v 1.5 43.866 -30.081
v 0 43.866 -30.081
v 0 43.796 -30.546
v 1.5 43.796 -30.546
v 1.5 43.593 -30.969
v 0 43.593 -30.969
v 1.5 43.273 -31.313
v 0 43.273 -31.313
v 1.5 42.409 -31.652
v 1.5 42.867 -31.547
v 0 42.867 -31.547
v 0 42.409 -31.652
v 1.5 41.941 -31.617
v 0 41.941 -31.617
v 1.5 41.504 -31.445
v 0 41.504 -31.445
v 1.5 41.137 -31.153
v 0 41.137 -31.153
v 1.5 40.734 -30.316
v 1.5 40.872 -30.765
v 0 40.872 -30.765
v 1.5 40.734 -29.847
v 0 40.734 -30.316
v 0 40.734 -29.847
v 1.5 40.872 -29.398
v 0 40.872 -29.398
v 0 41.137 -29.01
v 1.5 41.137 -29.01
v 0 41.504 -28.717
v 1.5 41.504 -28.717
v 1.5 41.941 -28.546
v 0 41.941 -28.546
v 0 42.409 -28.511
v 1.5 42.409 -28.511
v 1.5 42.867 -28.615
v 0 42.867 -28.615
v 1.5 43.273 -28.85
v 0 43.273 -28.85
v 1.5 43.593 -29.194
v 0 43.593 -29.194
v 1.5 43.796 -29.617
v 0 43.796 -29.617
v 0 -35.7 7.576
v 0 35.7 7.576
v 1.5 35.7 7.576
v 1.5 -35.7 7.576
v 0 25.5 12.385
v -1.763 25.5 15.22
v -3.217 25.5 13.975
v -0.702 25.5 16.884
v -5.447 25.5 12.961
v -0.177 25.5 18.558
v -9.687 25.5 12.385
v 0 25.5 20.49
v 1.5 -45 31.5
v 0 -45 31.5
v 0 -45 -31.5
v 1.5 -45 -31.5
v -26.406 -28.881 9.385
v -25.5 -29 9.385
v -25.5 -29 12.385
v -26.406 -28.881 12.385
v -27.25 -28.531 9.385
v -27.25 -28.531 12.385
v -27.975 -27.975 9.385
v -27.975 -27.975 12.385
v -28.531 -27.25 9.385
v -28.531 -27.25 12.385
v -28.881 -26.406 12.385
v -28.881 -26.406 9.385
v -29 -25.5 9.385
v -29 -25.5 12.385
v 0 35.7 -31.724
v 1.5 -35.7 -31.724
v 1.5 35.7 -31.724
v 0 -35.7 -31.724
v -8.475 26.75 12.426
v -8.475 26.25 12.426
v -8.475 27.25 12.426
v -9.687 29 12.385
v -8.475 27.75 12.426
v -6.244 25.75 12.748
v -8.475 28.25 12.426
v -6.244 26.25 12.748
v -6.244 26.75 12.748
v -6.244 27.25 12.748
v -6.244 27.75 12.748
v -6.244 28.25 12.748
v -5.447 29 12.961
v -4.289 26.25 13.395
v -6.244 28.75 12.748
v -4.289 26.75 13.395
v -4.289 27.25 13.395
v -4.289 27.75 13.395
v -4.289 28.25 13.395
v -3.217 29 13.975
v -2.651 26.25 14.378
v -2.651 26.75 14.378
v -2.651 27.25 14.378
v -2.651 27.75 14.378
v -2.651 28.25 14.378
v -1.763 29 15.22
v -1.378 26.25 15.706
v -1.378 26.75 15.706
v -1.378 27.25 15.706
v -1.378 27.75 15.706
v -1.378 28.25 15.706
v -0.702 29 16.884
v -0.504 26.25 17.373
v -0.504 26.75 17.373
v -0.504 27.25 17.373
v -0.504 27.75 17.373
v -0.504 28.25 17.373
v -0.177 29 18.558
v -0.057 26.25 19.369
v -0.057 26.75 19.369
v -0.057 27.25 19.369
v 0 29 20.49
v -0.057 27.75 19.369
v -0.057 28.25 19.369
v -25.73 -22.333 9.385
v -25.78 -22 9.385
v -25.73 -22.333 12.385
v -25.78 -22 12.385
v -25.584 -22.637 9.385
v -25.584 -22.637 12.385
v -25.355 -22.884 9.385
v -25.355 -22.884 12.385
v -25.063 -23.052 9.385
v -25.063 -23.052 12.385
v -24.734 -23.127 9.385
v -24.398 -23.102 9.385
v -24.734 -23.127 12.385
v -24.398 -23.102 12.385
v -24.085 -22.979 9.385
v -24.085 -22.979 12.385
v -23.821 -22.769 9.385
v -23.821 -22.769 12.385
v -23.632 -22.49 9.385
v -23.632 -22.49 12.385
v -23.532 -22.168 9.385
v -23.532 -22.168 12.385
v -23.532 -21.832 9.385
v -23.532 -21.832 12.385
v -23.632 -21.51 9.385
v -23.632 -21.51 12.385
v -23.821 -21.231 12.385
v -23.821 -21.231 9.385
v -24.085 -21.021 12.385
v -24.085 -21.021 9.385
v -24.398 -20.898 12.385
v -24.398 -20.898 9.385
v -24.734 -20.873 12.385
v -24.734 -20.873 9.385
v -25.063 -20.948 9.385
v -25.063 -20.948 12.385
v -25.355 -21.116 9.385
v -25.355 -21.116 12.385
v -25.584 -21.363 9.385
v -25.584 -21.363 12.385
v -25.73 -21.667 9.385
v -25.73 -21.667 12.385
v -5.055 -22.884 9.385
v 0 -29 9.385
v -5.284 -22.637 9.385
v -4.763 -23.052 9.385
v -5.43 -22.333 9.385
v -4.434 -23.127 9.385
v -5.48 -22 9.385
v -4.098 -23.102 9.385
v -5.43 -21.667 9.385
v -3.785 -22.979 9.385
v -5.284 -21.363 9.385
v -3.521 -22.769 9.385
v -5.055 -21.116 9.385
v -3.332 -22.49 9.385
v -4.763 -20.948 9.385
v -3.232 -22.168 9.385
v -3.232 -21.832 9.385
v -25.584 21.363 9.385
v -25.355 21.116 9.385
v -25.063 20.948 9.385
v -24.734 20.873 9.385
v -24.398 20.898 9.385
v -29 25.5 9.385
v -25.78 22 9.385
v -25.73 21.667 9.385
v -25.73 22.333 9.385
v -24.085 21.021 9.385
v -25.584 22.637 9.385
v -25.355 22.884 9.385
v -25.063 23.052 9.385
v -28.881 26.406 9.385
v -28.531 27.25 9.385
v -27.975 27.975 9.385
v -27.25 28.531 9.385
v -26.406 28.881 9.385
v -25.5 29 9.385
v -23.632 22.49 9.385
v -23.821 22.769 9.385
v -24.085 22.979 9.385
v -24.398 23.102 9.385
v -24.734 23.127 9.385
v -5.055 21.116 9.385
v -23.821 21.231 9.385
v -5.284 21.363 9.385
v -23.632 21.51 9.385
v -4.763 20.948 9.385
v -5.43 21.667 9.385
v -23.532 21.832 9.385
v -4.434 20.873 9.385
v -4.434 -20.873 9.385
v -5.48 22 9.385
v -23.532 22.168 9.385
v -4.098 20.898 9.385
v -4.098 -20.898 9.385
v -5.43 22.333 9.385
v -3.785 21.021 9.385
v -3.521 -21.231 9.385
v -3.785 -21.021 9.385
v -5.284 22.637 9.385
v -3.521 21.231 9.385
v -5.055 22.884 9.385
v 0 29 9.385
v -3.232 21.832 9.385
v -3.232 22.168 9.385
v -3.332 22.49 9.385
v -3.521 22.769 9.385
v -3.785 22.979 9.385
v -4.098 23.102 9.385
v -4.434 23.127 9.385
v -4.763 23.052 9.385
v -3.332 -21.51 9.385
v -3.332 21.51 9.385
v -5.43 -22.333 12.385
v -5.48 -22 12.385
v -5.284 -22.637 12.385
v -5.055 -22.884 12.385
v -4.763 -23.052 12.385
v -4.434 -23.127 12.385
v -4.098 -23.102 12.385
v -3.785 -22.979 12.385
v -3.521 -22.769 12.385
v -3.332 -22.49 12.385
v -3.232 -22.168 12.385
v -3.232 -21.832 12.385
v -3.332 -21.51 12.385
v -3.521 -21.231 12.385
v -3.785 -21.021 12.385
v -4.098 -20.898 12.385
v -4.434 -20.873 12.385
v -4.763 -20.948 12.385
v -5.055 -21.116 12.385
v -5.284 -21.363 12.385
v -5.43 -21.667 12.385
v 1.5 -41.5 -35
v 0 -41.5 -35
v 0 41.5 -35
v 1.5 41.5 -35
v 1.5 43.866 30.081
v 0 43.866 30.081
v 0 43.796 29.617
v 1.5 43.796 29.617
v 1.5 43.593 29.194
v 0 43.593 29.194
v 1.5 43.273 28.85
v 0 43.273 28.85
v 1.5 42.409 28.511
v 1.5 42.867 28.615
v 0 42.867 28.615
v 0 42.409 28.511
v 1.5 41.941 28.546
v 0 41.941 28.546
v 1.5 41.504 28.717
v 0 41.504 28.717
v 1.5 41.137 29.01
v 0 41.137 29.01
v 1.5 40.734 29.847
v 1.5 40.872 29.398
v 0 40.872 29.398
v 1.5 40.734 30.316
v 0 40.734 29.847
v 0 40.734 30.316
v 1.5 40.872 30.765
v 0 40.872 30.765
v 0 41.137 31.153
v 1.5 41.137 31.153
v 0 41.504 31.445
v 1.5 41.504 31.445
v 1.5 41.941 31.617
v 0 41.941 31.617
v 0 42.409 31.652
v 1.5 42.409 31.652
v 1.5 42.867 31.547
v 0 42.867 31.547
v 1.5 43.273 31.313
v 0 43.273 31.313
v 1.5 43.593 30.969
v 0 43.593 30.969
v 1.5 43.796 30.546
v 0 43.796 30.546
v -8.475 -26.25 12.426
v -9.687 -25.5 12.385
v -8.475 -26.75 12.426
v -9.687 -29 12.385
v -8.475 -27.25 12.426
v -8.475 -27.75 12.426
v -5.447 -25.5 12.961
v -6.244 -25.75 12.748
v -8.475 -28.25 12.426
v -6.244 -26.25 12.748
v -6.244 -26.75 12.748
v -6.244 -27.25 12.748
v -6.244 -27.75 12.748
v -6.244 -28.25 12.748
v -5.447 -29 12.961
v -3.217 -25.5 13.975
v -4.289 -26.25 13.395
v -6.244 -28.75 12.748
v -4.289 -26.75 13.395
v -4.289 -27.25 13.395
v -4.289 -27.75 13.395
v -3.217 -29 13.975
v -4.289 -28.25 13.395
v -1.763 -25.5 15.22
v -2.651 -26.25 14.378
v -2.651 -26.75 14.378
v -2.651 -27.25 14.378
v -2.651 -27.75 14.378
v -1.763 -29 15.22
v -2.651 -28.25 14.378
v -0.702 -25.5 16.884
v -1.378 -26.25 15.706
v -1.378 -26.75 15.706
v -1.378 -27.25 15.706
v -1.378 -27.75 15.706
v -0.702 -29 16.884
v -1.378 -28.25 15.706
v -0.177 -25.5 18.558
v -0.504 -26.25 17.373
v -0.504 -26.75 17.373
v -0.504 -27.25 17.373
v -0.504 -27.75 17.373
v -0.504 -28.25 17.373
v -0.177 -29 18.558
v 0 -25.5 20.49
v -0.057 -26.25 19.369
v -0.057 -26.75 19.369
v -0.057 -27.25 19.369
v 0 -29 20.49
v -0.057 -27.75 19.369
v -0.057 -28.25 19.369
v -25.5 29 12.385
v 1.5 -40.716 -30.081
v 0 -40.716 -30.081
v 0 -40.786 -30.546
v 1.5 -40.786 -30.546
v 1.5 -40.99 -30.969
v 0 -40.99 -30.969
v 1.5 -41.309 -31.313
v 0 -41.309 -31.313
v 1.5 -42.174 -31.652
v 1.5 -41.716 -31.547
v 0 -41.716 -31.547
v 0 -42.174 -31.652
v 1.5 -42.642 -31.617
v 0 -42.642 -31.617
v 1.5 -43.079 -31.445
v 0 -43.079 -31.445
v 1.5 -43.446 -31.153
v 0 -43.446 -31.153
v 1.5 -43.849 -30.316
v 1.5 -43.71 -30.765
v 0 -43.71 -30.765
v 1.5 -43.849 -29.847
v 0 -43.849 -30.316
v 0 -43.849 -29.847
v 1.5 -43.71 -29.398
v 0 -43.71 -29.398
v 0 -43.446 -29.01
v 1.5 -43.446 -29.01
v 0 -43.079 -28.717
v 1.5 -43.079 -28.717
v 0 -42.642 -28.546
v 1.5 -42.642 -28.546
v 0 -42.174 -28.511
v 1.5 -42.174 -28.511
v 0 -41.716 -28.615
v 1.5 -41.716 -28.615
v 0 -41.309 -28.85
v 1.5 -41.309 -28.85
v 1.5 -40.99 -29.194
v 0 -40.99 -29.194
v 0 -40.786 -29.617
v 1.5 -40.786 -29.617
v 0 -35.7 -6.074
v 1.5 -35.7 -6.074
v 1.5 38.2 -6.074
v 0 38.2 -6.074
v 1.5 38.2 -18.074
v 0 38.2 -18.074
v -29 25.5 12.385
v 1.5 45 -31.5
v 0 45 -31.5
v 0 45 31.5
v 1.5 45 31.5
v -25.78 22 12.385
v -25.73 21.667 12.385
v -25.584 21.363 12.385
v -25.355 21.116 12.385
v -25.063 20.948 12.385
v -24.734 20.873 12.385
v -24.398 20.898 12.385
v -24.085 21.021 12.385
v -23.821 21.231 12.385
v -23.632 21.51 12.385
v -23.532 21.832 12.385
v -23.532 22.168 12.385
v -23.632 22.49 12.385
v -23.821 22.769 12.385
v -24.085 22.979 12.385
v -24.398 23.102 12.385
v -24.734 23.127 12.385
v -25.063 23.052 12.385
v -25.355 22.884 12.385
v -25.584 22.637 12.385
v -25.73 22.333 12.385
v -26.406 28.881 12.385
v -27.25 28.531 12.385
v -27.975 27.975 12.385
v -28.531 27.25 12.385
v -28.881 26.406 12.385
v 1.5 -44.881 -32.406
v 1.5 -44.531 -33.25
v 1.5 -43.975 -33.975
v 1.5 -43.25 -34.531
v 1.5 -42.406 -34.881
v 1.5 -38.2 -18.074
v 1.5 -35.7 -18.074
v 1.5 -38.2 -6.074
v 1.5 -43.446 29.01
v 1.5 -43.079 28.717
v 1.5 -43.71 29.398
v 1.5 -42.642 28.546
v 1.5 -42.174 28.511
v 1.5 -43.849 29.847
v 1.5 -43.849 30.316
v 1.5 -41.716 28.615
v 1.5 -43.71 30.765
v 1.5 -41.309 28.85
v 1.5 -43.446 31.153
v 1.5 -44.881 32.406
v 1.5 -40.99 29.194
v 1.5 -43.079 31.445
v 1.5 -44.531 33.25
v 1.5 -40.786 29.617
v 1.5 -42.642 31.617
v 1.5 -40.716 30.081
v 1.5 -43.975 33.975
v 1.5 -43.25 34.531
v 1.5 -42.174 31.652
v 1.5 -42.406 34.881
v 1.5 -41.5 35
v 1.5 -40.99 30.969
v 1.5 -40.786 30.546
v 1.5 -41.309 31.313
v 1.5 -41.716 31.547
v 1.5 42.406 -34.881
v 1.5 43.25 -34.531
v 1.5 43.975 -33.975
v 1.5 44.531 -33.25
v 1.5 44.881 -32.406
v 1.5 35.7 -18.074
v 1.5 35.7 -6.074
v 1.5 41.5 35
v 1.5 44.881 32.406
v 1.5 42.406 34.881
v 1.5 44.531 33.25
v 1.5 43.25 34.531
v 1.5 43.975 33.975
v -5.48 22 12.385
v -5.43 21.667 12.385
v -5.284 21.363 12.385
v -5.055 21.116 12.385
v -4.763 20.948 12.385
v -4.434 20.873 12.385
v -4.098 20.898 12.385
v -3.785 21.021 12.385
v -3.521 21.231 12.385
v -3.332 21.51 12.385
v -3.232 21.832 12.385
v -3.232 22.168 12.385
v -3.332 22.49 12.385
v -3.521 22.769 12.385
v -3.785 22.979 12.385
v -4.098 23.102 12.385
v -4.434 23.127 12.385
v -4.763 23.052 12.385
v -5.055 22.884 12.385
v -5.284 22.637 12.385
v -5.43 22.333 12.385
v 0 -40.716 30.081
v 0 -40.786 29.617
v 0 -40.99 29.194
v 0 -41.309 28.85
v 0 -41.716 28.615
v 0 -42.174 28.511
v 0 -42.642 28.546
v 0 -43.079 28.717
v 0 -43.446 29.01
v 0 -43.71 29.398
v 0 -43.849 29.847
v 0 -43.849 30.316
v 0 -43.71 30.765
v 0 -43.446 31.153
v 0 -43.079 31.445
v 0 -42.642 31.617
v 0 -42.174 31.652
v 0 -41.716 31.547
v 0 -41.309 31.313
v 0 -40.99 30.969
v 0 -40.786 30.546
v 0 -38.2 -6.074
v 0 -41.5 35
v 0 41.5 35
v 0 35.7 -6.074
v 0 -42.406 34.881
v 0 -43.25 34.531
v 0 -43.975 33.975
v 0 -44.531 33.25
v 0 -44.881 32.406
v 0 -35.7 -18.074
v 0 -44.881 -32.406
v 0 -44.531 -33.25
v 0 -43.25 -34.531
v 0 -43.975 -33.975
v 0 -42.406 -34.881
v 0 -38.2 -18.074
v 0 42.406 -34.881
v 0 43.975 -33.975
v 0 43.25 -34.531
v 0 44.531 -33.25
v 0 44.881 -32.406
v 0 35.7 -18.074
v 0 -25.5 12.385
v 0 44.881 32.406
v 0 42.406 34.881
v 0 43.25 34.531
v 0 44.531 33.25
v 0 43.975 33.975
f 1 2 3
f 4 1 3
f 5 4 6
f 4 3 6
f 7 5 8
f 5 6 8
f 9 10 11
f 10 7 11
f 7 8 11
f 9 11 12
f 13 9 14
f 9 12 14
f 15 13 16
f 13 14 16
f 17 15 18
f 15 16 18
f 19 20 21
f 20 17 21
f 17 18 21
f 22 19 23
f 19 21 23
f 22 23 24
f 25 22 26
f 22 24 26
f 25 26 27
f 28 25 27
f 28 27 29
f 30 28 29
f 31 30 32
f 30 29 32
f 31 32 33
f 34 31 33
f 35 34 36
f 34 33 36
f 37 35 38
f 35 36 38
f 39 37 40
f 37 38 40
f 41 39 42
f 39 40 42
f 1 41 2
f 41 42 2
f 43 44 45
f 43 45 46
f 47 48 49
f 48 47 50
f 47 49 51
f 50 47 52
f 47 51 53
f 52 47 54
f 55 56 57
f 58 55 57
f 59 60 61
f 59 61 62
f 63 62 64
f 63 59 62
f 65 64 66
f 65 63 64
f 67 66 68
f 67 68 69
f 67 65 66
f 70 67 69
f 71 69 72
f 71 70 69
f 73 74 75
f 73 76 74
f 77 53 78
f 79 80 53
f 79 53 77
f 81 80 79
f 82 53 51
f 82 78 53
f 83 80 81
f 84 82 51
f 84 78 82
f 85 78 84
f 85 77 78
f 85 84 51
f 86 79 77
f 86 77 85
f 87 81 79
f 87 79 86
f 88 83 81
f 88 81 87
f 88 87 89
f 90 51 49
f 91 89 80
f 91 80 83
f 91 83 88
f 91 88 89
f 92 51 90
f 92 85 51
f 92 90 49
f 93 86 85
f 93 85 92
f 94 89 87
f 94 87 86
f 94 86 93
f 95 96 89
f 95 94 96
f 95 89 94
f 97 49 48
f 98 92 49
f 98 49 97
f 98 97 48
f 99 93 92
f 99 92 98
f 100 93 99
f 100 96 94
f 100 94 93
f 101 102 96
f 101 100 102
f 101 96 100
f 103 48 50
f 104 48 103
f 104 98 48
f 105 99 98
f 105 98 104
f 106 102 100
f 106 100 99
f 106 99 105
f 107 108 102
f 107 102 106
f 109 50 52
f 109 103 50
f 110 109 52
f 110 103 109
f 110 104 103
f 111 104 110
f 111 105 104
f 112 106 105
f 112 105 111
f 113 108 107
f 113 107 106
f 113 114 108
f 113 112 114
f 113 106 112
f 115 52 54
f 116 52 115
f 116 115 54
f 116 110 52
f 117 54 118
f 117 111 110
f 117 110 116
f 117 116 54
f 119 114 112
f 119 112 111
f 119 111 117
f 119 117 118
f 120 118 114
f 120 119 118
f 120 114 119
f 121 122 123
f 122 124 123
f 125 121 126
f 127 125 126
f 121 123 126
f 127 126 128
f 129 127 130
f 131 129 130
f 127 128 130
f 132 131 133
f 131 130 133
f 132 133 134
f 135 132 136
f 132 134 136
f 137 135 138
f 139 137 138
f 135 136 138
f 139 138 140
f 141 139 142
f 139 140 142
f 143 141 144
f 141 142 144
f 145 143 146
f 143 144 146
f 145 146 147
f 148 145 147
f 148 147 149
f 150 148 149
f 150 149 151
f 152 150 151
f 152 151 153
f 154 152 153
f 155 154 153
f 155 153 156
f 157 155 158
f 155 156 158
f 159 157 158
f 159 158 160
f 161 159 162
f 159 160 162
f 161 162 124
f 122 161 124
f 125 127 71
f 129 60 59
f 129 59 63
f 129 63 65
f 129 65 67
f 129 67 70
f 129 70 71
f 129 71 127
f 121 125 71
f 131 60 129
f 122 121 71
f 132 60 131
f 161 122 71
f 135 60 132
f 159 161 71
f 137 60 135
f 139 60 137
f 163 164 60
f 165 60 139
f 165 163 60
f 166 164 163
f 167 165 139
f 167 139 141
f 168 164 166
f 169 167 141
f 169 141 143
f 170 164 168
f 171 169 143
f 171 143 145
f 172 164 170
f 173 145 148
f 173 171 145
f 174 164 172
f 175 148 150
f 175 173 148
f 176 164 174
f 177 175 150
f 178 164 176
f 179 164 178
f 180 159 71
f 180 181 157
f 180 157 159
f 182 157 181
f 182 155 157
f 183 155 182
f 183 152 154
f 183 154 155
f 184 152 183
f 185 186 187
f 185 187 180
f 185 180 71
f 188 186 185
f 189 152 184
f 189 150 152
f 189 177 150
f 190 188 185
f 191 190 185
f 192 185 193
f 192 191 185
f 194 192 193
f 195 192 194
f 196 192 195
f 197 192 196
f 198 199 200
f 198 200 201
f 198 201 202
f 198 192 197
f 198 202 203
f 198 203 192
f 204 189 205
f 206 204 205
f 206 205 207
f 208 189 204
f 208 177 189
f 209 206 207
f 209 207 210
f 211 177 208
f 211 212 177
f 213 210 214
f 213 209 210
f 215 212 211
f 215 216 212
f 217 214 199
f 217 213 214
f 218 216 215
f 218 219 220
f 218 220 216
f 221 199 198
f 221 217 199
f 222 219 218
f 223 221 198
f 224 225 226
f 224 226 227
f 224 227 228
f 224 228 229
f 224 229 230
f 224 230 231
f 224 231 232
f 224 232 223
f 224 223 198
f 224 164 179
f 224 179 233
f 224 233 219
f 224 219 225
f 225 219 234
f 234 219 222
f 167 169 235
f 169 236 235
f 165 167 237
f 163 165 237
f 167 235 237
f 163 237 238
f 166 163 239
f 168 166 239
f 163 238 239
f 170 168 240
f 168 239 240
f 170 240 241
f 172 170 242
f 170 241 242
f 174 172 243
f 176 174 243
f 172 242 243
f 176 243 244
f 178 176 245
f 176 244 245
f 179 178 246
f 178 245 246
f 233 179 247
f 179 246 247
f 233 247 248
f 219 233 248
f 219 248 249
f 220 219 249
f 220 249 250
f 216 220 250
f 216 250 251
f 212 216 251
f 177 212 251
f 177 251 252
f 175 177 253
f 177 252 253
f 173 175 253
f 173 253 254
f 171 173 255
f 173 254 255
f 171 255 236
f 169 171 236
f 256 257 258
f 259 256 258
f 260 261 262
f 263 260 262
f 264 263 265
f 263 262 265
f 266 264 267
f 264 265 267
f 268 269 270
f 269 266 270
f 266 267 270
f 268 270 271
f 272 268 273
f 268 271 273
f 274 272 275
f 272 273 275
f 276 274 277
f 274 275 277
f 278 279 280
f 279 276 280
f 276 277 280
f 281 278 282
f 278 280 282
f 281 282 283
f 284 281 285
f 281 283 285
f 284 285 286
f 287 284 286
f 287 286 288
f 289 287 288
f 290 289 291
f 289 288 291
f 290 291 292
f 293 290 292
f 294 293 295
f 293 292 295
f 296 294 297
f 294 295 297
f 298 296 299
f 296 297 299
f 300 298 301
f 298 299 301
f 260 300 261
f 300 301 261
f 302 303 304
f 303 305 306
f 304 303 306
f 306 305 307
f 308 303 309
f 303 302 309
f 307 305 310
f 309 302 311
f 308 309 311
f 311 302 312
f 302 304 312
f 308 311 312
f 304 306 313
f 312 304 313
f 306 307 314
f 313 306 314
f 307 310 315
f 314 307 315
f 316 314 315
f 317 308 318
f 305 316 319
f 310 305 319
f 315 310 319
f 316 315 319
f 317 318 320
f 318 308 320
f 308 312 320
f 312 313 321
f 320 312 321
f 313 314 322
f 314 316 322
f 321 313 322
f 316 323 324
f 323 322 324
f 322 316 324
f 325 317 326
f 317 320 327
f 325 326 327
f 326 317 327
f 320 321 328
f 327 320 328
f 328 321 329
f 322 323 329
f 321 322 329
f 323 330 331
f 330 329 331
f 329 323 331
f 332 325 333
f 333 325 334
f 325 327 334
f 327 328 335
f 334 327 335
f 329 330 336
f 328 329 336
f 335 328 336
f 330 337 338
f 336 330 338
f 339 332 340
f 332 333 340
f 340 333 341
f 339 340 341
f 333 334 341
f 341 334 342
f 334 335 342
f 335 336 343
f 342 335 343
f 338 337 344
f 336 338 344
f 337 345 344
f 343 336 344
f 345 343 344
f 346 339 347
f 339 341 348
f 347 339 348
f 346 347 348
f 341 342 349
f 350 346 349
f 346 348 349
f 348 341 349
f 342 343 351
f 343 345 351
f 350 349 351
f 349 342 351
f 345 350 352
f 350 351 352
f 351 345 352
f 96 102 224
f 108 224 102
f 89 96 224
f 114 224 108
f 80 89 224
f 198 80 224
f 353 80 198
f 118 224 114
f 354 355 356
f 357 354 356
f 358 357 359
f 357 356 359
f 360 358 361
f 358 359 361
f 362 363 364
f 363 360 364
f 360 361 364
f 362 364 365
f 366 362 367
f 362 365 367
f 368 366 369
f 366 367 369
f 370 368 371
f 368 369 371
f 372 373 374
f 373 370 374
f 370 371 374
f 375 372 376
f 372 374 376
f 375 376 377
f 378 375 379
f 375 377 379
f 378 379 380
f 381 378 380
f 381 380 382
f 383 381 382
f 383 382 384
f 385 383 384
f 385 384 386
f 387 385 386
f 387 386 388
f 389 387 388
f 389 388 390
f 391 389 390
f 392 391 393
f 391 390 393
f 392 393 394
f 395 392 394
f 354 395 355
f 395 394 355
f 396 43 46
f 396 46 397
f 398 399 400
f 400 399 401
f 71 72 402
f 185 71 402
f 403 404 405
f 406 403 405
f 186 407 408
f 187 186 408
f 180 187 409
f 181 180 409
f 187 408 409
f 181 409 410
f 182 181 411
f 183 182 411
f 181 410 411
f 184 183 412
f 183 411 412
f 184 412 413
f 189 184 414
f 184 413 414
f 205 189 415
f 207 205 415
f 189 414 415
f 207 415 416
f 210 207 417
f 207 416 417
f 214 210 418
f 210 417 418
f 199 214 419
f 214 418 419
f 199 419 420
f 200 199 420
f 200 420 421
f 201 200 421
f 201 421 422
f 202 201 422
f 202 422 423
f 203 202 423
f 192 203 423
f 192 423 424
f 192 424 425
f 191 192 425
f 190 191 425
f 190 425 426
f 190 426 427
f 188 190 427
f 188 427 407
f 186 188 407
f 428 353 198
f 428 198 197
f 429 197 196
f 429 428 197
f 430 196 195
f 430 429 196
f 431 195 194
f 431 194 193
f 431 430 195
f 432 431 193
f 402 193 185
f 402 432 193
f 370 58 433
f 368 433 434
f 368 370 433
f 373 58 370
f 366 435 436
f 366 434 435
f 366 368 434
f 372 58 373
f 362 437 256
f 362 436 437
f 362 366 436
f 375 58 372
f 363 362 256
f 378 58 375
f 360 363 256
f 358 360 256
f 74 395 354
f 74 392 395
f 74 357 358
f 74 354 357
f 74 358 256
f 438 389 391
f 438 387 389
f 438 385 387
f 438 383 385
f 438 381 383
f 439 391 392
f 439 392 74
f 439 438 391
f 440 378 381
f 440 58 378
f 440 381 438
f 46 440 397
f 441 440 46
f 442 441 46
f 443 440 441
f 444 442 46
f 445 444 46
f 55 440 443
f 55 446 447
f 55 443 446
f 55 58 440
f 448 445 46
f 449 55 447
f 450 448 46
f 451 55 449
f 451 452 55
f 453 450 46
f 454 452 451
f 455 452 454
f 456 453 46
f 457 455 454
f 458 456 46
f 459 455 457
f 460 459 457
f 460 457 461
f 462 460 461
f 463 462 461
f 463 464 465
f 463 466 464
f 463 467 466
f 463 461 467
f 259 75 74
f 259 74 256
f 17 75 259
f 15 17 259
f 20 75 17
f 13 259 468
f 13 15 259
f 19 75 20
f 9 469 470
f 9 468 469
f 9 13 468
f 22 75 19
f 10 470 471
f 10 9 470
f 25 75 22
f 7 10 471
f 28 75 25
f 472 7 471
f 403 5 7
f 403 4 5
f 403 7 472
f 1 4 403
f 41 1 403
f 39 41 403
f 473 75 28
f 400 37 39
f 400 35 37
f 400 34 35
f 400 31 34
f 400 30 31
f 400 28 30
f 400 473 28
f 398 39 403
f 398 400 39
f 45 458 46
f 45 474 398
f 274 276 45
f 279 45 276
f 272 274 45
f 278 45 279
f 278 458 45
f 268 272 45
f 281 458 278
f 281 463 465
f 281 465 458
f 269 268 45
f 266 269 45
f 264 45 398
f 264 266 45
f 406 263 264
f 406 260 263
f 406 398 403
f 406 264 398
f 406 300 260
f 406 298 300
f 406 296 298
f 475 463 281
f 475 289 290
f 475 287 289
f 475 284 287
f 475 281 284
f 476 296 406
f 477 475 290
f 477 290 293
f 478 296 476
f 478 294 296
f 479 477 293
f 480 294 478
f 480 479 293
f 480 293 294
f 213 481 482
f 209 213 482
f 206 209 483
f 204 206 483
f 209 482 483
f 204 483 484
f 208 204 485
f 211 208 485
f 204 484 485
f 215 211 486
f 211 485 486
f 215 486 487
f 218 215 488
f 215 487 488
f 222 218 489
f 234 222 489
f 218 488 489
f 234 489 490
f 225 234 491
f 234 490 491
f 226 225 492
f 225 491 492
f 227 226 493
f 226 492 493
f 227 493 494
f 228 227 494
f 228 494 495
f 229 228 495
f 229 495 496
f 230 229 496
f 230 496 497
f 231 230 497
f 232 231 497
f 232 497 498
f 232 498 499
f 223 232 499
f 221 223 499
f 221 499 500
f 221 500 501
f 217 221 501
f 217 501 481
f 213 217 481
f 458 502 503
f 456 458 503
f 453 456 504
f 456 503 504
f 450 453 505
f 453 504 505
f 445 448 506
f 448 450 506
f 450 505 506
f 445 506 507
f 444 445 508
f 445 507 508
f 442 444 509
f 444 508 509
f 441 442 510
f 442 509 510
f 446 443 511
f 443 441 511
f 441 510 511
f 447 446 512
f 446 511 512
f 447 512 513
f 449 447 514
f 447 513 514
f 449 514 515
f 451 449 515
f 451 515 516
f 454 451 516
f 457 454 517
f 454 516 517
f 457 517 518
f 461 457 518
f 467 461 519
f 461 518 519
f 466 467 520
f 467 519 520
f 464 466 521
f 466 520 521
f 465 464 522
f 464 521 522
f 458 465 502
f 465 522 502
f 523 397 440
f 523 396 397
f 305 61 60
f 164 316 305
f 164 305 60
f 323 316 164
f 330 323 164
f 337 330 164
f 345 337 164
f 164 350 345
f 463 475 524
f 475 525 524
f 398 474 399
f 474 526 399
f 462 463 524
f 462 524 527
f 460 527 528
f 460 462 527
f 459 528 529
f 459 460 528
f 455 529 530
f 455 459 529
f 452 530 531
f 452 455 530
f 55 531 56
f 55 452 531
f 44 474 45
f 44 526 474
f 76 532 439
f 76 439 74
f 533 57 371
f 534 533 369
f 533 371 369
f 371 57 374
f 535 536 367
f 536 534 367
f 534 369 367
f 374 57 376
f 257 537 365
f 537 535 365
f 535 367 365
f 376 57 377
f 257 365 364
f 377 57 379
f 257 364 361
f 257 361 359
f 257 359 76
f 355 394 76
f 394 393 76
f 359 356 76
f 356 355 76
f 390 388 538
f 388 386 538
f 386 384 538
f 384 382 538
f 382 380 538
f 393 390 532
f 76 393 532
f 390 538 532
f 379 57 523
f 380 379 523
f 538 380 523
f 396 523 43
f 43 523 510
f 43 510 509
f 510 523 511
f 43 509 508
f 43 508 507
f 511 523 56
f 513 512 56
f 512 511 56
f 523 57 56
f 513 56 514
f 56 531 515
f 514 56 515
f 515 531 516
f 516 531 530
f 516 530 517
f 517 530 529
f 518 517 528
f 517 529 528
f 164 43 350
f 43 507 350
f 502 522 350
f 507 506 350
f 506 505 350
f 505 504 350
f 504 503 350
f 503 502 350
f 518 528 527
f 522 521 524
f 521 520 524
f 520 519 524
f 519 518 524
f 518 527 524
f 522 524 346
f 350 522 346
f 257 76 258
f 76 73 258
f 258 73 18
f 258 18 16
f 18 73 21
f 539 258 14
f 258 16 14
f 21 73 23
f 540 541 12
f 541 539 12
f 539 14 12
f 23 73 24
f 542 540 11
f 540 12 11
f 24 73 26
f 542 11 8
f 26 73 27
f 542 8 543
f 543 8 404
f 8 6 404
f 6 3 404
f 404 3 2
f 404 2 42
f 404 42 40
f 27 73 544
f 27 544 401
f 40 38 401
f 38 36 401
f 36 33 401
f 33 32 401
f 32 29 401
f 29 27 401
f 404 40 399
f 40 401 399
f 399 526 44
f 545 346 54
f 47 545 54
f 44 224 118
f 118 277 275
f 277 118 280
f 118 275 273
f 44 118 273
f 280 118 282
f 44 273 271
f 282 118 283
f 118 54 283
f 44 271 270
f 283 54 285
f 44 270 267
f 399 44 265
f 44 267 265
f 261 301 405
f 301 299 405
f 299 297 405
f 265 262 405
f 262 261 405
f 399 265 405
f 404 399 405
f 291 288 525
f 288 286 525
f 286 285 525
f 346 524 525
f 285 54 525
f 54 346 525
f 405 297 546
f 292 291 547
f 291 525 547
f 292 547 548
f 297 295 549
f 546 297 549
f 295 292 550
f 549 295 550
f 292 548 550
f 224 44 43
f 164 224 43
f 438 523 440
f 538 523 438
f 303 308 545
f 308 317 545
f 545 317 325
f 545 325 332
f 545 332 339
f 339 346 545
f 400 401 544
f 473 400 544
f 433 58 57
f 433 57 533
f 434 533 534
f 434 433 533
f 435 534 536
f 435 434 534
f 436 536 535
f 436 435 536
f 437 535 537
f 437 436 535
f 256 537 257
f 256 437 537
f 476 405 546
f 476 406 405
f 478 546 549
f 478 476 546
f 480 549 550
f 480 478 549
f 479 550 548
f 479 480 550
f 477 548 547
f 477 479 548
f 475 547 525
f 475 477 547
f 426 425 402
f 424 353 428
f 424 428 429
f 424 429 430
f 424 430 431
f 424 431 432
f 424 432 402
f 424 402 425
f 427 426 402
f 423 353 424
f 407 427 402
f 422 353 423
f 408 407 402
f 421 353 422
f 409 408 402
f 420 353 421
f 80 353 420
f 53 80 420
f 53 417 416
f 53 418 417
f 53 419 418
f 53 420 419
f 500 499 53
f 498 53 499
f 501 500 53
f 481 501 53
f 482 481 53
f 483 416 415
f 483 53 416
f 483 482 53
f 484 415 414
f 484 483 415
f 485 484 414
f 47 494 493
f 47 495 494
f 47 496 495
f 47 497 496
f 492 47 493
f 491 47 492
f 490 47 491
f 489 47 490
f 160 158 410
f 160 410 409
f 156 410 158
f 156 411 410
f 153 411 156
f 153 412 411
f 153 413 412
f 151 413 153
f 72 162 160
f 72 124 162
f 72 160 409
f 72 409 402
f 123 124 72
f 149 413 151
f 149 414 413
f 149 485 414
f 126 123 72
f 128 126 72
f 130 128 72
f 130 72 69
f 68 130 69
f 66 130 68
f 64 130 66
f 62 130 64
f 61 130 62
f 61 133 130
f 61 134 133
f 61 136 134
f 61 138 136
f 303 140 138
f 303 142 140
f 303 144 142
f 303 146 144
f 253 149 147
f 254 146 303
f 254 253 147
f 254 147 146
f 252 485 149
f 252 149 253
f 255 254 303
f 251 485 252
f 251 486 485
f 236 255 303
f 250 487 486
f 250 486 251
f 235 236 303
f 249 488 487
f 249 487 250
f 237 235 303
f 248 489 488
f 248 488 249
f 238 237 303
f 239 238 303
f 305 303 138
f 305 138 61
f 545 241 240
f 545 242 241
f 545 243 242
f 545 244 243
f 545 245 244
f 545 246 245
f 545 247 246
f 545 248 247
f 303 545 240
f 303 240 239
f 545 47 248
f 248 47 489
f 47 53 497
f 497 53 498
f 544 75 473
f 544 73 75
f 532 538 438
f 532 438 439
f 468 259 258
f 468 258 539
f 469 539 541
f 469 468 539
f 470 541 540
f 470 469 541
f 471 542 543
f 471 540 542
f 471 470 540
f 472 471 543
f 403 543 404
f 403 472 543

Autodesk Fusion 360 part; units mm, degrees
sketch "Sketch1" plane through (0, 0, 0) normal (1, 0, 0) x (0, 1, 0)
  line L0 (45, 35) -> (-45, 35)
  line L1 (-45, 35) -> (-45, -35)
  line L2 (-45, -35) -> (45, -35)
  line L3 (45, -35) -> (45, 35)
  line L4 (45, 35) -> (-45, -35) construction
  line L5 (-45, 35) -> (45, -35) construction
  line L6 (0, 0) -> (0, -35) construction
  line L7 (39.5, 9.4262) -> (-39.5, 9.4262) construction
  line L8 (-39.5, 9.4262) -> (-39.5, -33.5738) construction
  line L9 (-39.5, -33.5738) -> (39.5, -33.5738) construction
  line L10 (39.5, -33.5738) -> (39.5, 9.4262) construction
  line L11 (39.5, 9.4262) -> (-39.5, -33.5738) construction
  line L12 (-39.5, 9.4262) -> (39.5, -33.5738) construction
  line L13 (35.7, 7.5762) -> (-35.7, 7.5762)
  line L14 (-35.7, 7.5762) -> (-35.7, -31.7238)
  line L15 (-35.7, -31.7238) -> (35.7, -31.7238)
  line L16 (35.7, -31.7238) -> (35.7, 7.5762)
  line L17 (35.7, 7.5762) -> (-35.7, -31.7238) construction
  line L18 (-35.7, 7.5762) -> (35.7, -31.7238) construction
  circle A0 centre (42.2913, -30.0813) radius 1.575
  line L19 (0, 0) -> (10.5805, 0) construction
  circle A1 centre (-42.2913, -30.0813) radius 1.575
  circle A2 centre (42.2913, 30.0813) radius 1.575
  circle A3 centre (-42.2913, 30.0813) radius 1.575
  line L20 (0, 0) -> (0, 0.8708) construction
  line L21 (0, 0.8708) -> (0, 35) construction
  line L22 (25, 32.3854) -> (-25, 32.3854) construction
  line L23 (-25, 32.3854) -> (-25, 12.3854) construction
  line L24 (-25, 12.3854) -> (25, 12.3854) construction
  line L25 (25, 12.3854) -> (25, 32.3854) construction
  line L26 (25, 32.3854) -> (-25, 12.3854) construction
  line L27 (-25, 32.3854) -> (25, 12.3854) construction
  line L28 (29, 12.3854) -> (-29, 12.3854)
  line L29 (-29, 12.3854) -> (-29, 9.3854)
  line L30 (-29, 9.3854) -> (29, 9.3854)
  line L31 (29, 9.3854) -> (29, 12.3854)
  line L32 (29, 12.3854) -> (-29, 9.3854) construction
  line L33 (-29, 12.3854) -> (29, 9.3854) construction
  line L34 (0, -12.0738) -> (39.5, -12.0738) construction
  line L35 (35.7, -6.0738) -> (38.2, -6.0738)
  line L36 (38.2, -6.0738) -> (38.2, -18.0738)
  line L37 (38.2, -18.0738) -> (35.7, -18.0738)
  line L38 (35.7, -18.0738) -> (35.7, -6.0738)
  line L39 (-38.2, -18.0738) -> (-35.7, -18.0738)
  line L40 (-38.2, -6.0738) -> (-38.2, -18.0738)
  line L41 (-35.7, -6.0738) -> (-38.2, -6.0738)
  point P0 (0, -12.0738)
  point P1 (0, -12.0738)
  point P2 (0, 22.3854)
  point P3 (0, 10.8854)
  point P4 (38.2, -12.0738)
  dimension "d8" = 90
  dimension "d9" = 70
  dimension "d12" = 79
  dimension "d13" = 43
  dimension "d14" = 71.4
  dimension "d15" = 39.3
  dimension "d17" = 3.15
  dimension "d21" = 50
  dimension "d22" = 20
  dimension "d25" = 58
  dimension "d26" = 3
  dimension "d58" = 2.5
  dimension "d59" = 12
extrude "Extrude1" add sketch "Sketch1" along normal blind 1.5 contours L0 L1 L2 L3 | L28 L29 L30 L31
extrude "Extrude2" add sketch "Sketch1" against normal blind 29 contours L28 L29 L30 L31
sketch "Sketch2" plane through (0, 0, 12.3854) normal (0, 0, 1) x (-1, 0, 0)
  line L0 (0, 29) -> (0, -29)
  line L1 (0, -29) -> (29, -29)
  line L2 (29, -29) -> (29, 29)
  line L3 (29, 29) -> (0, 29)
  line L4 (0, 29) -> (29, -29) construction
  line L5 (27.5, 25) -> (1.5, 25) construction
  line L6 (1.5, 25) -> (1.5, -25) construction
  line L7 (1.5, -25) -> (27.5, -25) construction
  line L8 (27.5, -25) -> (27.5, 25) construction
  line L9 (27.5, 25) -> (1.5, -25) construction
  line L10 (1.5, 25) -> (27.5, -25) construction
  circle A0 centre (4.35, -22) radius 1.575 construction
  circle A1 centre (24.65, -22) radius 1.575 construction
  circle A2 centre (4.35, 22) radius 1.575 construction
  circle A3 centre (24.65, 22) radius 1.575 construction
  line L11 (4.35, -22) -> (24.65, 22) construction
  circle A4 centre (4.35, -22) radius 1.1303
  circle A5 centre (24.65, -22) radius 1.1303
  circle A6 centre (4.35, 22) radius 1.1303
  circle A7 centre (24.65, 22) radius 1.1303
  point P0 (14.5, 0)
  point P1 (14.5, 0)
  point P2 (14.5, 0)
  dimension "d32" = 26
  dimension "d33" = 50
  dimension "d37" = 3.15
  dimension "d40" = 20.3
  dimension "d41" = 44
  dimension "d51" = 2.2606
  dimension "d54" = 20.3
  dimension "d55" = 44
fillet "Fillet1" radius 3.5 2 edges at (-29, 29, 10.8854) (-29, -29, 10.8854)
fillet "Fillet2" radius 3.5 4 edges at (0.75, 45, 35) (0.75, 45, -35) (0.75, -45, 35) (0.75, -45, -35)
sketch "Sketch3" plane through (0, -29, 0) normal (0, -1, 0) x (1, 0, 0)
  line L0 (-25.5, 12.3854) -> (-25.5, 9.3854)
  line L1 (-25.5, 9.3854) -> (0, 9.3854)
  line L2 (0, 9.3854) -> (0, 12.3854)
  line L3 (0, 12.3854) -> (-25.5, 12.3854)
  line L4 (0, 35) -> (0, -35) construction
  line L5 (-27.5, 12.3854) -> (-1.5, 12.3854) construction
  spline S0 degree 5 poles (-9.6866, 12.3854) (-9.3387, 12.3854) (-8.655, 12.4012) (-7.6662, 12.4723) (-6.4221, 12.6617) (-4.9991, 13.0566) (-3.7214, 13.6129) (-2.6063, 14.3356) (-1.6713, 15.2291) (-0.9285, 16.2912) (-0.387, 17.5173) (-0.1222, 18.6267) (-0.0222, 19.5305) (0, 20.1649) (0, 20.4901) knots 0 0 0 0 0 0 0.1 0.2 0.3 0.4 0.5 0.6 0.7 0.8 0.9 1 1 1 1 1 1
  line L6 (0, 18.6225) -> (0, 22.3578)
  line L7 (-11.558, 12.3854) -> (-7.8153, 12.3854)
  line L8 (-9.6866, 12.3854) -> (0, 12.3854)
  line L9 (0, 20.4901) -> (0, 12.3854)
  point P0 (-2.4919, 14.508)
extrude "Extrude3" add sketch "Sketch3" against normal blind 3.5 contours L3 S0 L6 L7 L8 L9
sketch "Sketch4" plane through (0, 29, 0) normal (0, 1, 0) x (-1, 0, 0)
  line L0 (25.5, 9.3854) -> (25.5, 12.3854)
  line L1 (25.5, 12.3854) -> (0, 12.3854)
  line L2 (0, 12.3854) -> (0, 9.3854)
  line L3 (0, 9.3854) -> (25.5, 9.3854)
  line L4 (0, 12.3854) -> (9.6866, 12.3854)
  spline S0 degree 5 poles (9.6866, 12.3854) (9.3387, 12.3854) (8.655, 12.4012) (7.6662, 12.4723) (6.4221, 12.6617) (4.9991, 13.0566) (3.7214, 13.6129) (2.6063, 14.3356) (1.6713, 15.2291) (0.9285, 16.2912) (0.387, 17.5173) (0.1222, 18.6267) (0.0222, 19.5305) (0, 20.1649) (0, 20.4901) knots 0 0 0 0 0 0 0.1 0.2 0.3 0.4 0.5 0.6 0.7 0.8 0.9 1 1 1 1 1 1
  line L5 (0, 20.4901) -> (0, 12.3854)
extrude "Extrude4" add sketch "Sketch4" against normal blind 3.5 contours L1 L4 S0 L5
extrude "Extrude5" cut sketch "Sketch2" against normal blind 3 contours A4 | A5 | A6 | A7
equation "cutout_length = 71.4 mm" comment "71 mm from the manual"
equation "cutout_height = 39.3 mm" comment "39mm from the manual"
equation "plastic_thick = 1.5 mm"
equation "tab_width = 12 mm"
equation "tab_thick = 2.5 mm"
equation "panel_width = 90 mm"
equation "panel_height = 70 mm"
equation "d8 = panel_width"
equation "d9 = panel_height"
equation "power_supply_width = 79 mm"
equation "power_supply_height = 43 mm"
equation "d12 = power_supply_width"
equation "d13 = power_supply_height"
equation "d14 = cutout_length"
equation "d15 = cutout_height"
equation "mount_through_hole_diam = 3.15 mm"
equation "d17 = mount_through_hole_diam"
equation "relay_height = 20 mm"
equation "relay_length = 50 mm"
equation "relay_width = 26 mm"
equation "d21 = relay_length"
equation "d22 = relay_height"
equation "relay_ledge_thick = 3 mm"
equation "relay_ledge_length = relay_length + 8 mm"
equation "d25 = relay_ledge_length"
equation "d26 = relay_ledge_thick"
equation "relay_ledge_width = relay_width + 3 mm"
equation "d28 = plastic_thick"
equation "d30 = -relay_ledge_width"
equation "d32 = relay_width"
equation "d33 = relay_length"
equation "relay_dist_bw_holes_length = 44 mm"
equation "relay_dist_bw_holes_width = 20.3 mm"
equation "relay_hole_diam = 3.15 mm"
equation "d37 = relay_hole_diam"
equation "d40 = relay_dist_bw_holes_width"
equation "d41 = relay_dist_bw_holes_length"
equation "relay_mount_tap_diam = 0.089 in"
equation "d51 = relay_mount_tap_diam"
equation "d54 = relay_dist_bw_holes_width"
equation "d55 = relay_dist_bw_holes_length"
equation "d58 = tab_thick"
equation "d59 = tab_width"
